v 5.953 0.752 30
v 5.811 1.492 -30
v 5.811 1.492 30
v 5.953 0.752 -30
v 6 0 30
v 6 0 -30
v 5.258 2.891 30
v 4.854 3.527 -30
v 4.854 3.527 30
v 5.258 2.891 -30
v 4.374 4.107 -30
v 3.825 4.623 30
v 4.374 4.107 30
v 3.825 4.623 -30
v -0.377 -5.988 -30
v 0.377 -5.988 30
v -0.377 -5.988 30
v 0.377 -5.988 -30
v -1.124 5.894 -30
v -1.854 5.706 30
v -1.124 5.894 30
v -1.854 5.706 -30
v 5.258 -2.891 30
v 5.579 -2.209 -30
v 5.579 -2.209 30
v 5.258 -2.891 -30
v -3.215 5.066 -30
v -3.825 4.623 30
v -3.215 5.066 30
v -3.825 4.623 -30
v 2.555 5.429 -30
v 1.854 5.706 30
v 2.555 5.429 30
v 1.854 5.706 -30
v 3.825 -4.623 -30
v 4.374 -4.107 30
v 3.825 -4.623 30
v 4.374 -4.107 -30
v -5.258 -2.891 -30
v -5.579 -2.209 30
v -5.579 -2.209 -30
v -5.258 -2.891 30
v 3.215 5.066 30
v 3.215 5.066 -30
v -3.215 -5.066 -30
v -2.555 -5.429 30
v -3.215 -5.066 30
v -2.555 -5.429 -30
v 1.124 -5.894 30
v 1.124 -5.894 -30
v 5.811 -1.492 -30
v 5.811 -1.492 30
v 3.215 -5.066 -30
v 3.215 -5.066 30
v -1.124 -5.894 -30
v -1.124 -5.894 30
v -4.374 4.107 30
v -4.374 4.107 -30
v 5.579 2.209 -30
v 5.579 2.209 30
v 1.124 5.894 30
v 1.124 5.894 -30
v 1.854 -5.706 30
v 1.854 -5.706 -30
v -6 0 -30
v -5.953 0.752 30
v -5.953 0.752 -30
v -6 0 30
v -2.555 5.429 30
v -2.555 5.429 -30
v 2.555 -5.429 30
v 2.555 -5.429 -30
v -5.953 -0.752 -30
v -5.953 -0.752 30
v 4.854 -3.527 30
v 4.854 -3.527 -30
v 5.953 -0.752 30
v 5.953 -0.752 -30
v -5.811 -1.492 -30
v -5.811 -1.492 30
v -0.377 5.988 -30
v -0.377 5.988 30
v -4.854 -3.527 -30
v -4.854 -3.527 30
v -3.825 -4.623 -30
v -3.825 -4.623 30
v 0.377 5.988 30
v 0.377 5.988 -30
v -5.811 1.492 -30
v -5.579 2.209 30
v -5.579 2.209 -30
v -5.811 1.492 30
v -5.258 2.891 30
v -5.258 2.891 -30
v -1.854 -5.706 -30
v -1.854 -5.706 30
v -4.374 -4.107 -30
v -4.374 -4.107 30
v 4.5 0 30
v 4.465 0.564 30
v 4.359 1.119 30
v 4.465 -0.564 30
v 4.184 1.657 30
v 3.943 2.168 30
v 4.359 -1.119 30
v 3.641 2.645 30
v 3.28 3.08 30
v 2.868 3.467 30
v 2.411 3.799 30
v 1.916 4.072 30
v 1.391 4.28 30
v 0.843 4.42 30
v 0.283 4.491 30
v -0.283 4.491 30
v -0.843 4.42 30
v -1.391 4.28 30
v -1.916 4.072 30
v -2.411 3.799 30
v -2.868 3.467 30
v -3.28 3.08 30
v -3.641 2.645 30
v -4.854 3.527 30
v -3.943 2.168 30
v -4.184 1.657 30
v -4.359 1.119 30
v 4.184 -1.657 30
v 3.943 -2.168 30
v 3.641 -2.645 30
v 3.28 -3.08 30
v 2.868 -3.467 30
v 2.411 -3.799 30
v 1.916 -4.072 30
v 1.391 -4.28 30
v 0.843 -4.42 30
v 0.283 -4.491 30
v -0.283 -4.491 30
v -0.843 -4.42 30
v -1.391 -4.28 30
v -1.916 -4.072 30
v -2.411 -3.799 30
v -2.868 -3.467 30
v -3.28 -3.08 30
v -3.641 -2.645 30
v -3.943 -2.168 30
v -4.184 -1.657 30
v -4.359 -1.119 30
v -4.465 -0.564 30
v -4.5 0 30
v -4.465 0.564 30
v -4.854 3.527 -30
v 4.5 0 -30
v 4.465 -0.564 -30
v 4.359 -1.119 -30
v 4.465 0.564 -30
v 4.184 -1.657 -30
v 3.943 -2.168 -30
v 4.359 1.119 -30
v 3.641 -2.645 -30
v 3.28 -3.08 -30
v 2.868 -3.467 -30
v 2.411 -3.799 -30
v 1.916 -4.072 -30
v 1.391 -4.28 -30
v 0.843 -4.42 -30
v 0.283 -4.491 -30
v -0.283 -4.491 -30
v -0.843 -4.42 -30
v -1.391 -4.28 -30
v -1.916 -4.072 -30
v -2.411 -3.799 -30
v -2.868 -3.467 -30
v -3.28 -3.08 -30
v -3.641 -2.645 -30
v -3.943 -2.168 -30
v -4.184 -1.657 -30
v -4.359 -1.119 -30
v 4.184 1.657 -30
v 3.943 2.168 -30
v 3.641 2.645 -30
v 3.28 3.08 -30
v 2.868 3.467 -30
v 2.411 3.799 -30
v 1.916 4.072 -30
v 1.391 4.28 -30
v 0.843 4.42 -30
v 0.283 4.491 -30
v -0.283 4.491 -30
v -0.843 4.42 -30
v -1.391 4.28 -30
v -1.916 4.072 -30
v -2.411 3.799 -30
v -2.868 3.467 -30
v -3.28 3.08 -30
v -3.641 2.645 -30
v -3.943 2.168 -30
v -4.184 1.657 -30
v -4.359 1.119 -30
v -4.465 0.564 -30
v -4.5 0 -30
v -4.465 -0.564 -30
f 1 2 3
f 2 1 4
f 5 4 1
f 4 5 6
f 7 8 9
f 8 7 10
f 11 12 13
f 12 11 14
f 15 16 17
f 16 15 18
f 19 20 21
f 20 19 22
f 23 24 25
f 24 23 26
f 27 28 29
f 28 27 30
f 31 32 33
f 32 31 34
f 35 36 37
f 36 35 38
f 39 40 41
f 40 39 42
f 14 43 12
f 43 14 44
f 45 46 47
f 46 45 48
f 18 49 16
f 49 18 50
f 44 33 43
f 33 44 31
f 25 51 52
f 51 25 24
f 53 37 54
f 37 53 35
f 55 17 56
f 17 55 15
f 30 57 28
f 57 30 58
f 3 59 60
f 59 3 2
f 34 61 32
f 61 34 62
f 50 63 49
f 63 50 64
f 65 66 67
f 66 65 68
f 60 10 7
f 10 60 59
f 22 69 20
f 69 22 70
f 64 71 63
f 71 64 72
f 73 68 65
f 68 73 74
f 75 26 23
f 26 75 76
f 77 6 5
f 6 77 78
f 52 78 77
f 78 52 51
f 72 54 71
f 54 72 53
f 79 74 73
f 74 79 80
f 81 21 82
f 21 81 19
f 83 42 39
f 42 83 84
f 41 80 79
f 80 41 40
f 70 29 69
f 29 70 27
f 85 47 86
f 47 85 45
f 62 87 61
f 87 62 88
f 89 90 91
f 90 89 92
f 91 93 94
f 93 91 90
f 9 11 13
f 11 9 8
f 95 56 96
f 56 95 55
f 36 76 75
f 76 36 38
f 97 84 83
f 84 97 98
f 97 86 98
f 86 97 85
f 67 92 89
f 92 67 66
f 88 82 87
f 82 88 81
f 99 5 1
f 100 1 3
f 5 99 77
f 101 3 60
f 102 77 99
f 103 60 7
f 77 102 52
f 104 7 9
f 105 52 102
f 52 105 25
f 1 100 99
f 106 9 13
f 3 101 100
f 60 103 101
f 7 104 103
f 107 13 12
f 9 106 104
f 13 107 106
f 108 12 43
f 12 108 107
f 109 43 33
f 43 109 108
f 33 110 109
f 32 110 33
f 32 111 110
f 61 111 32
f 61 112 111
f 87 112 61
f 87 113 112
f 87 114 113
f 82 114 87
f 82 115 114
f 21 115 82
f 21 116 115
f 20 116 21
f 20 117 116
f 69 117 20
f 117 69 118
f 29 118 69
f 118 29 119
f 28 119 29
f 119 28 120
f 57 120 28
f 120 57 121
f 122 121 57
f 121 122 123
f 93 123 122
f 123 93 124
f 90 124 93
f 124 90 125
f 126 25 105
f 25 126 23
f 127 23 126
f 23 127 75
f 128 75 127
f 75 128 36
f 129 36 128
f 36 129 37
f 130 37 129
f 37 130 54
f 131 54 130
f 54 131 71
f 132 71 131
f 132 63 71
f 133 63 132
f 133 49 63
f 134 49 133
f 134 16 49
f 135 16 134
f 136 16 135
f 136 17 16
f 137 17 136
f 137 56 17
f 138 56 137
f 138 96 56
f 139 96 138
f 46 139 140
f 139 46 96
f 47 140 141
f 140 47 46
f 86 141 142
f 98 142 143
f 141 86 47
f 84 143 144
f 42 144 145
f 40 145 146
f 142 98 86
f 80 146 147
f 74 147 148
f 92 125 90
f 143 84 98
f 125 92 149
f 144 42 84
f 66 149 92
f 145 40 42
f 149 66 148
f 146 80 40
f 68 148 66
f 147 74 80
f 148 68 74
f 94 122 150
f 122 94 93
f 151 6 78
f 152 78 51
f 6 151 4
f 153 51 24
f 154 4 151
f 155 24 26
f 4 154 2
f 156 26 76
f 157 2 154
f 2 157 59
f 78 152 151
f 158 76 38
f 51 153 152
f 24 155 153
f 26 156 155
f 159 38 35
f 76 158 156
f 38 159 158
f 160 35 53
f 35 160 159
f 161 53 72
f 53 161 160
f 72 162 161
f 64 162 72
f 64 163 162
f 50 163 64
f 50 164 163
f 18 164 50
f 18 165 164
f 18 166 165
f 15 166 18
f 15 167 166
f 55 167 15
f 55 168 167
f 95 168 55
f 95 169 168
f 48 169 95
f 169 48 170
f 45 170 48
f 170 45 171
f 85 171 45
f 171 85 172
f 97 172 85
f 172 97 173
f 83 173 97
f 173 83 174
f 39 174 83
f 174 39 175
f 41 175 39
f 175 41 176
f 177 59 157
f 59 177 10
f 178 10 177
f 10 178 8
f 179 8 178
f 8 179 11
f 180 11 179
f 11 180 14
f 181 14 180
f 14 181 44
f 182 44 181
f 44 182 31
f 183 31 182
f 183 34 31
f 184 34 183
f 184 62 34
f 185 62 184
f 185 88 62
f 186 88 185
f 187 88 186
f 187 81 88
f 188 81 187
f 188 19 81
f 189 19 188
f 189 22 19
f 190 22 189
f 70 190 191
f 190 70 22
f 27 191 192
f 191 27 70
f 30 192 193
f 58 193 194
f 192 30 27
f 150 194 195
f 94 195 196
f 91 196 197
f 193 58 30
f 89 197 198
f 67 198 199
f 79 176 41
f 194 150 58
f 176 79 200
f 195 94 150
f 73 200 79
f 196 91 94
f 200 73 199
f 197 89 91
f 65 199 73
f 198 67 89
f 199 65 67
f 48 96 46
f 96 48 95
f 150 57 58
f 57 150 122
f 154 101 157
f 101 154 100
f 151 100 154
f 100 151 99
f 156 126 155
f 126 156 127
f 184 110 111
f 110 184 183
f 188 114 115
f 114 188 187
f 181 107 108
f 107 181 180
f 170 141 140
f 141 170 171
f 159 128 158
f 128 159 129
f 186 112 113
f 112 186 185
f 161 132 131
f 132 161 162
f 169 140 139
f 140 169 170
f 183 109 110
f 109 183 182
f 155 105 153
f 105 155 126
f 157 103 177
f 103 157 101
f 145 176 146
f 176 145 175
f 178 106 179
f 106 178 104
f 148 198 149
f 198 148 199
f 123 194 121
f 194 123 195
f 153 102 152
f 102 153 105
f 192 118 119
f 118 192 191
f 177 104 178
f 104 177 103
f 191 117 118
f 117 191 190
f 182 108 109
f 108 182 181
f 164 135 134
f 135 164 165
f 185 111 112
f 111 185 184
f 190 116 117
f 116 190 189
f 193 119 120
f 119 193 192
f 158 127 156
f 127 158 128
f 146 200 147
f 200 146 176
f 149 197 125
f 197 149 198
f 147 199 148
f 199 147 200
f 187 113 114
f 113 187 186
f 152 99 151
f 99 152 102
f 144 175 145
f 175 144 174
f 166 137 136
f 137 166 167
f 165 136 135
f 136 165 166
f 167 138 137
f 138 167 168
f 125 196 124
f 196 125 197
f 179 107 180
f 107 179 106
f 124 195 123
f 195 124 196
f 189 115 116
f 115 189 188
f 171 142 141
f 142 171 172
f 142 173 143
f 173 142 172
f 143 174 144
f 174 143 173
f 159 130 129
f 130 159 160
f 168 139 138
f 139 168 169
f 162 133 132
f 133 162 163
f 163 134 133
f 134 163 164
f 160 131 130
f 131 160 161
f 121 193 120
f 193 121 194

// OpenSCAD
$fn = 50;


difference() {
	union() {
		translate(v = [0, 0, -30.0000000000]) {
			cylinder(h = 60, r = 6.0000000000);
		}
	}
	union() {
		translate(v = [0, 0, -100.0000000000]) {
			cylinder(h = 200, r = 4.5000000000);
		}
	}
}
